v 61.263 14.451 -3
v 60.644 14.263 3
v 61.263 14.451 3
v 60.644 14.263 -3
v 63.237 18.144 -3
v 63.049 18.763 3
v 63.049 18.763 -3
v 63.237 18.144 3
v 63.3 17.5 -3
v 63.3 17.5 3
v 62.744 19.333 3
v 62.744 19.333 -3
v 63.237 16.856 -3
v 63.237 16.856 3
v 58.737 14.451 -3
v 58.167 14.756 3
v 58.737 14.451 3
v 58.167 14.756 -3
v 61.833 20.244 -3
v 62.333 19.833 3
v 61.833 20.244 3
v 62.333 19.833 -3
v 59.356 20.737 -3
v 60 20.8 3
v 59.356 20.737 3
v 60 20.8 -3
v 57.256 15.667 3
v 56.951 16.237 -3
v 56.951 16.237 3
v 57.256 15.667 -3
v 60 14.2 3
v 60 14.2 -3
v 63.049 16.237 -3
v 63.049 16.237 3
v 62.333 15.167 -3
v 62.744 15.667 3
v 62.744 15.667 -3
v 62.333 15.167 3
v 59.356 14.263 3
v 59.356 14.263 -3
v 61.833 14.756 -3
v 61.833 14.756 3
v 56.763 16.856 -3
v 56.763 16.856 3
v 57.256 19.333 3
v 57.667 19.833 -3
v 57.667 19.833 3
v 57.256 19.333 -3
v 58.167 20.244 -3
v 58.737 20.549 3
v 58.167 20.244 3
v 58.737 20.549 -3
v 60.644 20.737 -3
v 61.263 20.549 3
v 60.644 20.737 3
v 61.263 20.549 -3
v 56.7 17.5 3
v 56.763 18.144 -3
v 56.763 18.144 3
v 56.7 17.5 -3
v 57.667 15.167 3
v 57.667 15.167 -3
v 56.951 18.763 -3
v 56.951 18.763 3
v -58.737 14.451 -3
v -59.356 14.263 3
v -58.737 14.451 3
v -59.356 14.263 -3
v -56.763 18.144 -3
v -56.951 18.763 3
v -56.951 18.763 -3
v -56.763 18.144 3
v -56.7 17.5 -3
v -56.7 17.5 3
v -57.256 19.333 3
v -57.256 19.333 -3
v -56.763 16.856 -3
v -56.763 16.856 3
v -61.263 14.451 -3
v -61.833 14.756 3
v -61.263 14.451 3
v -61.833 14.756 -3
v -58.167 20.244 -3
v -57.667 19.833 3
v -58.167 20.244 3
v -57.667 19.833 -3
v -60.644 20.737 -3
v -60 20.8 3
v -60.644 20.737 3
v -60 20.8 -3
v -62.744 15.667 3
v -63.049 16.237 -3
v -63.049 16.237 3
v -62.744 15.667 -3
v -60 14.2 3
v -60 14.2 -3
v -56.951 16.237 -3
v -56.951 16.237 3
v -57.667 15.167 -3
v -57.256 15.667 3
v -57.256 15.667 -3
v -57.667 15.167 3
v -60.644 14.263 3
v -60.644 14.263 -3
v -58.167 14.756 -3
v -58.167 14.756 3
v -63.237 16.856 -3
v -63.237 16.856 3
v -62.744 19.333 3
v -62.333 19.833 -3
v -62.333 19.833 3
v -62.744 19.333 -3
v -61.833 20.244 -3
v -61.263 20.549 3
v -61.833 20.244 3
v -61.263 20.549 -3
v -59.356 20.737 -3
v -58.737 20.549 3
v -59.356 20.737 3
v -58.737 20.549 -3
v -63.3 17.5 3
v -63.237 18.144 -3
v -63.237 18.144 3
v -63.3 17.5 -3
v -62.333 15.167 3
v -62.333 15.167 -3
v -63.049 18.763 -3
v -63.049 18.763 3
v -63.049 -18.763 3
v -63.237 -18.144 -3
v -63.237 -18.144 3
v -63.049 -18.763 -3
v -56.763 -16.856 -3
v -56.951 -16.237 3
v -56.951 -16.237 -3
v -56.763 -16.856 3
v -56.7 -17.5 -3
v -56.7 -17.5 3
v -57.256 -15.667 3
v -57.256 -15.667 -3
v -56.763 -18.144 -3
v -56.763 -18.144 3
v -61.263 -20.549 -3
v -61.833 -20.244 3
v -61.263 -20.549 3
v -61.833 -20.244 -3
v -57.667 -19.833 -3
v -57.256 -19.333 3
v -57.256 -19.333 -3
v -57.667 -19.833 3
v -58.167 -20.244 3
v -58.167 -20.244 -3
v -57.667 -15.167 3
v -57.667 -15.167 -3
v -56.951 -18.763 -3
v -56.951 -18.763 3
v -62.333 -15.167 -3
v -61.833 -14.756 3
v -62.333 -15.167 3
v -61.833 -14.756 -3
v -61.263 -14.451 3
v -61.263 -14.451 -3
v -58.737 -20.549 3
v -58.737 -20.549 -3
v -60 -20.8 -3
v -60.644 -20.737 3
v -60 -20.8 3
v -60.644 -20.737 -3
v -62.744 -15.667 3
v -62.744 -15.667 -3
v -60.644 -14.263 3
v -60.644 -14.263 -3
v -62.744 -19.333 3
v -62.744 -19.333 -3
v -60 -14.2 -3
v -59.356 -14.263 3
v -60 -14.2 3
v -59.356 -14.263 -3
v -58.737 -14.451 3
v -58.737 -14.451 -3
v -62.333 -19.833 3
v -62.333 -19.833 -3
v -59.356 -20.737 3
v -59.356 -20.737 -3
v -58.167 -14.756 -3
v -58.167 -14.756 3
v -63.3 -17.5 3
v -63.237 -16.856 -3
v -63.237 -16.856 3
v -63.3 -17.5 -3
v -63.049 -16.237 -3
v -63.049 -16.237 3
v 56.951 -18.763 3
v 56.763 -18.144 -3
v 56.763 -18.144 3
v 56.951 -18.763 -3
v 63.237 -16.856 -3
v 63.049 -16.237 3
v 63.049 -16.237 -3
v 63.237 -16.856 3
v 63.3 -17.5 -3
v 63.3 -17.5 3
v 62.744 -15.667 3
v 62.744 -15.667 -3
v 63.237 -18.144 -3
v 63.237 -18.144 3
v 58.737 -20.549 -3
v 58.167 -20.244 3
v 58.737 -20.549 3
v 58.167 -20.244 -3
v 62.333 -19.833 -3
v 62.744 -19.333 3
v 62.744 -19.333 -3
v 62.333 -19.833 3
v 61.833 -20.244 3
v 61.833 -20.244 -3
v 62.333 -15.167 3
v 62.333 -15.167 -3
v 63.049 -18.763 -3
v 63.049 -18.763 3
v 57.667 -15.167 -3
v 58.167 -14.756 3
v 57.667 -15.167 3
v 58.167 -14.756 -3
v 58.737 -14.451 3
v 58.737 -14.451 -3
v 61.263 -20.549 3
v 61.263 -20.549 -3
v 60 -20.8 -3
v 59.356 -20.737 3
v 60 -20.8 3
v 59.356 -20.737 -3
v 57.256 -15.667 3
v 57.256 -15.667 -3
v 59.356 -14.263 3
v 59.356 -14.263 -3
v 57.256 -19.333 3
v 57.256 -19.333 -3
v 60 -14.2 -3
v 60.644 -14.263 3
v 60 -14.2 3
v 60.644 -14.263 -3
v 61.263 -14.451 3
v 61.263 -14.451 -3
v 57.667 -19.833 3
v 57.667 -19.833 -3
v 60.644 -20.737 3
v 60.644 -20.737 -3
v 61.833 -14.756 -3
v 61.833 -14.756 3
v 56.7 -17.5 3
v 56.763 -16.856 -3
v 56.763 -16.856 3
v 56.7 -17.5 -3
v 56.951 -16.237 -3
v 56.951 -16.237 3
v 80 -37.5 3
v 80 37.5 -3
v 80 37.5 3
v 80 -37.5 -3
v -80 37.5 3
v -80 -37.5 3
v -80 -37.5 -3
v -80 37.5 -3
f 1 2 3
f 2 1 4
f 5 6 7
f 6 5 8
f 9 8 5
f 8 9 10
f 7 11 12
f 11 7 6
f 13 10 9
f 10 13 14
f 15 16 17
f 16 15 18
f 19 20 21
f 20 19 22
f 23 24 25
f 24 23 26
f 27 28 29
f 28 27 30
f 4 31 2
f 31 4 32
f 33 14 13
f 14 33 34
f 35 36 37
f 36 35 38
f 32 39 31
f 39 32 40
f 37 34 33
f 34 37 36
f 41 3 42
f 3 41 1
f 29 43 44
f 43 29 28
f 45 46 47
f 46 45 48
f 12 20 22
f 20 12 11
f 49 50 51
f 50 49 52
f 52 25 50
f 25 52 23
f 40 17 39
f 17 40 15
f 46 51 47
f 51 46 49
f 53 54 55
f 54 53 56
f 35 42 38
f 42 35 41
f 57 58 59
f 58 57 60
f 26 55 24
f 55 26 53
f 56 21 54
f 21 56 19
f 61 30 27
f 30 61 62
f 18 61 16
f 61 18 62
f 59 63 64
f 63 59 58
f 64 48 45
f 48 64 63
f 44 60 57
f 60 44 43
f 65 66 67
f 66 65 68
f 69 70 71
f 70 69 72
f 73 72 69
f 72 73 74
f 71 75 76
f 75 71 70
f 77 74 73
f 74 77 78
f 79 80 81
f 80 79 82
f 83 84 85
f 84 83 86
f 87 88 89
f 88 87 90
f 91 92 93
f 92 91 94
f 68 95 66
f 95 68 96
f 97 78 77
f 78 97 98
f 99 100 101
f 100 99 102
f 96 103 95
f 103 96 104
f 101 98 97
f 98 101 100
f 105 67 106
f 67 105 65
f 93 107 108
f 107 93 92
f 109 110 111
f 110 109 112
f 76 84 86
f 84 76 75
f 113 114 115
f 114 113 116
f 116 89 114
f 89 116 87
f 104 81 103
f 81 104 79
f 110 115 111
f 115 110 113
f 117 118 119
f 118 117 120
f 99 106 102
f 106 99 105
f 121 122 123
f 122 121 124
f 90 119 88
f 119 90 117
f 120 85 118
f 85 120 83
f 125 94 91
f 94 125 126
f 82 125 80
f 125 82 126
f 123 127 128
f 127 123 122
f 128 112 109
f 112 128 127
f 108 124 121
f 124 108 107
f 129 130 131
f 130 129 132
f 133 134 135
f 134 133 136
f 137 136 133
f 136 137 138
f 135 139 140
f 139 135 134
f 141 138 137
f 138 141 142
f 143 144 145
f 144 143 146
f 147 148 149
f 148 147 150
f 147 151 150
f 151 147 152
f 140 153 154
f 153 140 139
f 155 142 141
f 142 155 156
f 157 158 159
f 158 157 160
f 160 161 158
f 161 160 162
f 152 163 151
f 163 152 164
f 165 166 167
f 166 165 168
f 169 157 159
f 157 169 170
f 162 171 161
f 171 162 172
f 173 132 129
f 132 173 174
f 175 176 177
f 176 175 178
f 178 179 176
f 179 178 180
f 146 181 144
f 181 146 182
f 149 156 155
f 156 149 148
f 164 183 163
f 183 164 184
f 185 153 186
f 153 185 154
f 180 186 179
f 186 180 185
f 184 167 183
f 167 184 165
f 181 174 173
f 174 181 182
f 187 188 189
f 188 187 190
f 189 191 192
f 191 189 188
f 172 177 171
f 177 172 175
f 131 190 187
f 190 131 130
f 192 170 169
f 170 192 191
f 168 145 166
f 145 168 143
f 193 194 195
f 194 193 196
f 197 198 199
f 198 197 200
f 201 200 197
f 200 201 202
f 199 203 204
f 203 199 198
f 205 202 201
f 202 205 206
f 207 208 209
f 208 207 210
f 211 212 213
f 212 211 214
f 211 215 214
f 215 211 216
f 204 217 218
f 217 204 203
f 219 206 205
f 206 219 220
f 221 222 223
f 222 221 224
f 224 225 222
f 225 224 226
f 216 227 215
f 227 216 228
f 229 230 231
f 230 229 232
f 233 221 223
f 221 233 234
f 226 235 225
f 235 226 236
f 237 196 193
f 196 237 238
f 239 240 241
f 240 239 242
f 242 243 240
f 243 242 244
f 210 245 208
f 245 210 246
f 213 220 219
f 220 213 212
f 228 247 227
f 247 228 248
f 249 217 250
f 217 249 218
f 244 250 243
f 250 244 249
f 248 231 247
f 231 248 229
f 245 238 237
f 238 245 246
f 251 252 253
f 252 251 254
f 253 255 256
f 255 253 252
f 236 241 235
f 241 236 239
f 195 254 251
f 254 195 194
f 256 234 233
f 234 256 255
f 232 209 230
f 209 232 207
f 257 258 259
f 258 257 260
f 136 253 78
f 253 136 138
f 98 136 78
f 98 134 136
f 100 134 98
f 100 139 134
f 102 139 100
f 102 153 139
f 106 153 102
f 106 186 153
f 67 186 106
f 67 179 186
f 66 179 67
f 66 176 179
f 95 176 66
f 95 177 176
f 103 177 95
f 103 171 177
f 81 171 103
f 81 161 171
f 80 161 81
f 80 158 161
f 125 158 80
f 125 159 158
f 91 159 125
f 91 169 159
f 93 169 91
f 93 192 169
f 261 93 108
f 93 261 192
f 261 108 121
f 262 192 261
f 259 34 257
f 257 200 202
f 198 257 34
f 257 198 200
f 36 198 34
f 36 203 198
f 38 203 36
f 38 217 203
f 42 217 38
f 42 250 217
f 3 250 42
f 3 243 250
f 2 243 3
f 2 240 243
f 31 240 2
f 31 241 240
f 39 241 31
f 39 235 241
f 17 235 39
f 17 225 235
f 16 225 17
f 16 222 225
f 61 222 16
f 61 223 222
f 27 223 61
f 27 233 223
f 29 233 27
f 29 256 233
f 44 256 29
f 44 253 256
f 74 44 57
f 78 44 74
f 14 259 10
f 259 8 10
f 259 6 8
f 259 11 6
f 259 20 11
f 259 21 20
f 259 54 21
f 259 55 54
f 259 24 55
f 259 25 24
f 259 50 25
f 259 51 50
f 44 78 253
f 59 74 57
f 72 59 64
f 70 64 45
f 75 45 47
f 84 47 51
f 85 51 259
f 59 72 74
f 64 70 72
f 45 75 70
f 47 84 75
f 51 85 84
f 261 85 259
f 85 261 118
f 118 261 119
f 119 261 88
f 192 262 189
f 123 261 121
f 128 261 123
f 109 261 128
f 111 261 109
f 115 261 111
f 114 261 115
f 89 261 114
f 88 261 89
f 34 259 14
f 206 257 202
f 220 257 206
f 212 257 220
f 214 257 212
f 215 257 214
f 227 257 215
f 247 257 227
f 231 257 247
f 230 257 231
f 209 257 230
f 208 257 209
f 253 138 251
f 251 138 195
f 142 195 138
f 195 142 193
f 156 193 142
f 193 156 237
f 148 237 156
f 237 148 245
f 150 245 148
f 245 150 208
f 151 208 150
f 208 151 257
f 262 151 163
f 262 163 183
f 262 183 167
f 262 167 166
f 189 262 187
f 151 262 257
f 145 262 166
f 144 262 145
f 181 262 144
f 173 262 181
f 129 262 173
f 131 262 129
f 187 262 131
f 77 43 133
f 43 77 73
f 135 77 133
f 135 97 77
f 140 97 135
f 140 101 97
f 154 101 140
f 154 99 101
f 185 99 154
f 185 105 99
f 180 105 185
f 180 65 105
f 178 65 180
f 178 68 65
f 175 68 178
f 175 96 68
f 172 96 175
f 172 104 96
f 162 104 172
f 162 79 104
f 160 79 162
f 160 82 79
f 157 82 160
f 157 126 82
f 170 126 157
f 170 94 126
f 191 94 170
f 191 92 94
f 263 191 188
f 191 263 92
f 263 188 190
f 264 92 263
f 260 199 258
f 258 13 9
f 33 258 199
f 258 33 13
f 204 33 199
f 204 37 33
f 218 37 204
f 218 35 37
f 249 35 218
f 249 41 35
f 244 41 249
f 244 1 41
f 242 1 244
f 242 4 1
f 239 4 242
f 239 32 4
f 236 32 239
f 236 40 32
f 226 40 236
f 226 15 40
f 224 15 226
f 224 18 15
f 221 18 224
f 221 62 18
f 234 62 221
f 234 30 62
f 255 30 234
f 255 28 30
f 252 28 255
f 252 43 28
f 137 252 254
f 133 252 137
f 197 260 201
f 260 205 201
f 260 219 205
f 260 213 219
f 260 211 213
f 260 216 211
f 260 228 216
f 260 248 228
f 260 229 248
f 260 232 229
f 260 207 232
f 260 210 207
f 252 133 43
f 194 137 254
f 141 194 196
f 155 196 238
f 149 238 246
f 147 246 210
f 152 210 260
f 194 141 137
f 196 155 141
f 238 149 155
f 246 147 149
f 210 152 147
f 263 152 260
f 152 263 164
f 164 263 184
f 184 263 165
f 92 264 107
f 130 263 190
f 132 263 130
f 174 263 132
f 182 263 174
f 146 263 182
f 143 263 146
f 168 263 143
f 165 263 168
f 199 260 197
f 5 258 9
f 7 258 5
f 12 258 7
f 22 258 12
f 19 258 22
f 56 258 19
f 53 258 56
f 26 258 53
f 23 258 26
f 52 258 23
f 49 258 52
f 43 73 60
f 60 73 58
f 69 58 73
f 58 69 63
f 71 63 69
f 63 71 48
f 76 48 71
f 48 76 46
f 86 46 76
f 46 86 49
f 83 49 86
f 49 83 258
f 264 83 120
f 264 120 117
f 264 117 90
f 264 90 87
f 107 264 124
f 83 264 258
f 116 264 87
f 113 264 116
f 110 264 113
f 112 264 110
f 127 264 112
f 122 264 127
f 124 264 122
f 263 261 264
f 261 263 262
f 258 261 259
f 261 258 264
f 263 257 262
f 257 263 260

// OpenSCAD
$fn = 32;

// ----------------------------------------------------------------------
// Corner plate 160 x 75 x 6
// 4 holes, centres taken from the edge offset
// ----------------------------------------------------------------------

// --- parameters (mm) ---
plate = [160, 75, 6];  // overall size (x, y, z)
holes = 4;             // number of holes the drawing asks for
hole_d = 6.6;          // hole diameter
edge = 20;             // hole centre offset from the plate edge

// --- derived feature positions (mm) ---
corner_x = plate[0] / 2 - edge;  // = 60   corner hole X
corner_y = plate[1] / 2 - edge;  // = 17.5   corner hole Y
feature_centers = [
  [corner_x, corner_y],
  [-corner_x, corner_y],
  [-corner_x, -corner_y],
  [corner_x, -corner_y]
];   // hole centres the loop below drills

// plate outline, every hole drilled through with the same cutters
difference() {
  cube(plate, center = true);
  for (centre = feature_centers)
    translate([centre[0], centre[1], 0])
      cylinder(d = hole_d, h = plate[2] + 2, center = true);
}
